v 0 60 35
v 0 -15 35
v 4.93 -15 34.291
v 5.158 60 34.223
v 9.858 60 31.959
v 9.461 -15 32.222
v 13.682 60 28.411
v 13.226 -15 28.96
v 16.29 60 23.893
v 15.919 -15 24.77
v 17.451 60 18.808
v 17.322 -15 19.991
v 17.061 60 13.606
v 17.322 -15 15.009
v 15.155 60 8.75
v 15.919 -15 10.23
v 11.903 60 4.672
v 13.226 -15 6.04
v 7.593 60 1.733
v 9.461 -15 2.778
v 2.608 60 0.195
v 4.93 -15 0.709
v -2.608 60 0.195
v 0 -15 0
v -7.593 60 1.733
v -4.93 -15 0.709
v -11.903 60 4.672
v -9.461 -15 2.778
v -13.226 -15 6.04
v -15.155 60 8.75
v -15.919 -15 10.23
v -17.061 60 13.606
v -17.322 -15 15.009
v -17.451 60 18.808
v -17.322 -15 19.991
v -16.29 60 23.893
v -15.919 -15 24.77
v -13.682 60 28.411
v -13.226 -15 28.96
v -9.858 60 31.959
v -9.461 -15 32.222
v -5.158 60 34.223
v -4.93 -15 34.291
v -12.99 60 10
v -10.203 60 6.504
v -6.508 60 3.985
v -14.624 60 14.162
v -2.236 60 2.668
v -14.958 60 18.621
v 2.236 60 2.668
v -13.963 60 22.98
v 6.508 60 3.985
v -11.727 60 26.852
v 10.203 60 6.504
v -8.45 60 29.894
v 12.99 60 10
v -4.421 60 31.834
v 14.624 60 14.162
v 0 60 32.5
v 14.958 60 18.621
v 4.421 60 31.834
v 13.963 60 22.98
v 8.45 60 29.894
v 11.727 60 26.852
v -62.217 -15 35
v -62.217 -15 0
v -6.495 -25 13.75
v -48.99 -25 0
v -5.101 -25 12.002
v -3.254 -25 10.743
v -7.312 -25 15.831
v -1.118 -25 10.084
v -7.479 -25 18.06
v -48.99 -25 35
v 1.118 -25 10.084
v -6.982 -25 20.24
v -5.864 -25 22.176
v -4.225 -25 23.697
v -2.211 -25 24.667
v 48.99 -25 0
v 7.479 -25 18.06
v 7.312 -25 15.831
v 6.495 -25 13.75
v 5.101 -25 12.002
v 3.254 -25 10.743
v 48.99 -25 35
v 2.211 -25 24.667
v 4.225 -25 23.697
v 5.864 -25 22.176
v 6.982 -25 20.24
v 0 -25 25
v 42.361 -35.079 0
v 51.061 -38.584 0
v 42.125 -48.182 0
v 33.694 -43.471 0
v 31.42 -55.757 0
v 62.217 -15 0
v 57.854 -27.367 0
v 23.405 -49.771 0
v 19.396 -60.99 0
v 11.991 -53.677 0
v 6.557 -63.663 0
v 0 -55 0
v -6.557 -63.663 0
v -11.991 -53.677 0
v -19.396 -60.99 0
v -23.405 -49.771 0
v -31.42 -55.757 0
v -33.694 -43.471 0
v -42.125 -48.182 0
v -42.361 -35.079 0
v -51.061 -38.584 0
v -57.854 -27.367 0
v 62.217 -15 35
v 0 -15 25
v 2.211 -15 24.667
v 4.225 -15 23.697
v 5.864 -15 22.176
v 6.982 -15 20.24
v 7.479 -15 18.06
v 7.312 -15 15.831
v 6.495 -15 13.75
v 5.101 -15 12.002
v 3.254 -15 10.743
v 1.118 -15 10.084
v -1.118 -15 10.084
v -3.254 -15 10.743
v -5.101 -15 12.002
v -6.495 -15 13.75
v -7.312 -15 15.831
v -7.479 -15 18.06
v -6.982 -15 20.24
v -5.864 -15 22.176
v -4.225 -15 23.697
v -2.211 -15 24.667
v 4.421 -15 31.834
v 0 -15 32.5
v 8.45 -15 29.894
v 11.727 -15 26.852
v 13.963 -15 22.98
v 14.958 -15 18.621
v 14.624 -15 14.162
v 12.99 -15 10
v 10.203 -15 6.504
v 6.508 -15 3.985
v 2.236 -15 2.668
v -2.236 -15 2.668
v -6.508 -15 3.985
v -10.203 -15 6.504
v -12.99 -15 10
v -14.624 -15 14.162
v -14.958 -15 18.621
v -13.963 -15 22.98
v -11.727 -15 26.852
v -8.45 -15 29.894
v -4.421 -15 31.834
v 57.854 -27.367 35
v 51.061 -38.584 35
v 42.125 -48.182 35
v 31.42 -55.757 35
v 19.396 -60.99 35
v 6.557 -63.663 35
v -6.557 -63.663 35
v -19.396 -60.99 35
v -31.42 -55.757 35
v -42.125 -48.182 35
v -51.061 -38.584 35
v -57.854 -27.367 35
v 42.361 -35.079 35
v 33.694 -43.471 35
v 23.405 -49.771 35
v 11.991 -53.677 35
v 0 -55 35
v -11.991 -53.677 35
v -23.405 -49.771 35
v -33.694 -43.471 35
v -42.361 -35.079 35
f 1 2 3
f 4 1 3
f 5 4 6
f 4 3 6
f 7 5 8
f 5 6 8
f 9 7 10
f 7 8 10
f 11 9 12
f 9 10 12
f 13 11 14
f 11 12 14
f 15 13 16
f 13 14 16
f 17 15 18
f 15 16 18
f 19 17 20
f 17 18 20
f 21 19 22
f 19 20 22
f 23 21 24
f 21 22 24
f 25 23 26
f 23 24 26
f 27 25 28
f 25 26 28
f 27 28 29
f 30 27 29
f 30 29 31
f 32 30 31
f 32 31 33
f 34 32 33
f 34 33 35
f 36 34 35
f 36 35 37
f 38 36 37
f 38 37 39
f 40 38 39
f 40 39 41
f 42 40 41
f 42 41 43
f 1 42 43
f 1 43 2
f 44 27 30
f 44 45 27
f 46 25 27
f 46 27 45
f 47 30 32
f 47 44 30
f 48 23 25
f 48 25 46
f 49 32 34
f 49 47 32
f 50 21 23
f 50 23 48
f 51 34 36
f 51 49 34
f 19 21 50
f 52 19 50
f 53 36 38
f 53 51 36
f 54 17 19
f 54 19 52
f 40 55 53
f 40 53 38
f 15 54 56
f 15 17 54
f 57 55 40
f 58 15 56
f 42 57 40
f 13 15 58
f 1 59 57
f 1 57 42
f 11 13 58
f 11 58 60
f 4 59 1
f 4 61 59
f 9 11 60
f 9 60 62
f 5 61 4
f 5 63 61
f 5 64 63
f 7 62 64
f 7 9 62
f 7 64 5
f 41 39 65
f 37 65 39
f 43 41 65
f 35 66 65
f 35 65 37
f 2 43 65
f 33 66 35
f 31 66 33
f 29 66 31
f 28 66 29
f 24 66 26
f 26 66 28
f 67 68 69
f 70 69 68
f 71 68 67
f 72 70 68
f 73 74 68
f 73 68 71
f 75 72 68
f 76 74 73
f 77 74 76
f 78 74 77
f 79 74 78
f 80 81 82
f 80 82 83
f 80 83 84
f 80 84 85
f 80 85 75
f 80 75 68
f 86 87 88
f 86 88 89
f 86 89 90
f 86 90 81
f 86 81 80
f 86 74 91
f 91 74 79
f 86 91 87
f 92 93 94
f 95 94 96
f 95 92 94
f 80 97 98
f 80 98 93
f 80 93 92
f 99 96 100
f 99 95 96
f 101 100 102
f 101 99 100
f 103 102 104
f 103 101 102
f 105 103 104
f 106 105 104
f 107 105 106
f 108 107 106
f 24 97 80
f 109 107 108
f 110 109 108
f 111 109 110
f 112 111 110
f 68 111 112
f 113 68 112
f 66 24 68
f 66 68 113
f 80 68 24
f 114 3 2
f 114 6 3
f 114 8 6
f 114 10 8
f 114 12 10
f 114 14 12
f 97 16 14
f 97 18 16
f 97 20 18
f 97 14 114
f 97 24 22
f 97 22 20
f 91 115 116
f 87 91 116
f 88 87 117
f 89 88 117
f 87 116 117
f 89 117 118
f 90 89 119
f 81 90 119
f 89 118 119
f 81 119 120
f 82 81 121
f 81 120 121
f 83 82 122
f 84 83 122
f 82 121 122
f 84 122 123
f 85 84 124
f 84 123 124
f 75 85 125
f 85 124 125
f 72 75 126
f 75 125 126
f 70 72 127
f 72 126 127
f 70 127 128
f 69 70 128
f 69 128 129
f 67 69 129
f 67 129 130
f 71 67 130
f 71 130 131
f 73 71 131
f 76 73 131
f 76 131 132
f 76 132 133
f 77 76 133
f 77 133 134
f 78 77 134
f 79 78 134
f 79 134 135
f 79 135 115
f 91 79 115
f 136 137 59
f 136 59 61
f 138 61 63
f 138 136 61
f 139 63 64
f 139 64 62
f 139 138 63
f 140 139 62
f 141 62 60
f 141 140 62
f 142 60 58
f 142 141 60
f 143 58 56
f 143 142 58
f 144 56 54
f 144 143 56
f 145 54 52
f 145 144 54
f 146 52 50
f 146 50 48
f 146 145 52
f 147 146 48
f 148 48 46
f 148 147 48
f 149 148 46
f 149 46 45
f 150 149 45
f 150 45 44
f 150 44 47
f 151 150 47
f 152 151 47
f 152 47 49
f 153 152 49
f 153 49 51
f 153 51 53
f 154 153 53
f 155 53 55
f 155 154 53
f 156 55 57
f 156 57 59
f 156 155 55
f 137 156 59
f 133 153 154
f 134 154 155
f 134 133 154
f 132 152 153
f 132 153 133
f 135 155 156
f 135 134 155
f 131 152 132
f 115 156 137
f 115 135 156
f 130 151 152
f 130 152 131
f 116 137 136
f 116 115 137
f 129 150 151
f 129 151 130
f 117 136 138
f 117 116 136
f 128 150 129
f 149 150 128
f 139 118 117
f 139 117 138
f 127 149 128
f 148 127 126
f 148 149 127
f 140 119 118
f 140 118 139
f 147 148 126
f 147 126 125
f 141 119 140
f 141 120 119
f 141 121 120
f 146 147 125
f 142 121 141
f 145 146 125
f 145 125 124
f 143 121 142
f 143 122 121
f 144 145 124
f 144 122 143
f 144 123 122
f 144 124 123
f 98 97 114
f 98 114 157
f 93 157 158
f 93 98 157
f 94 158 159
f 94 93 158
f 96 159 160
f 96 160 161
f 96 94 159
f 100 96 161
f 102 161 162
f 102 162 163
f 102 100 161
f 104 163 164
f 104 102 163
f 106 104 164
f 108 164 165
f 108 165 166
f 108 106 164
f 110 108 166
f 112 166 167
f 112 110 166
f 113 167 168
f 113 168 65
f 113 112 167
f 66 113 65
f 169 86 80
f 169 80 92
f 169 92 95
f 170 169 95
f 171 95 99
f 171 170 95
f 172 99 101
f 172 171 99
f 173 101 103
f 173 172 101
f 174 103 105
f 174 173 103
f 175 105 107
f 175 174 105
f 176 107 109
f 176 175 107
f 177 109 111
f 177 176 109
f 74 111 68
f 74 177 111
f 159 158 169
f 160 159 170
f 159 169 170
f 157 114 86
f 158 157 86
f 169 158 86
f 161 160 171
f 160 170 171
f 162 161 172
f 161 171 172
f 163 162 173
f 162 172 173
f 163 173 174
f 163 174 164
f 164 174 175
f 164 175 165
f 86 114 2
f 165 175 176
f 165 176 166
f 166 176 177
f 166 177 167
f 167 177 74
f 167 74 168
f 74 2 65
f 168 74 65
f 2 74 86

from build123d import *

# Parameters (mm, degrees)
Y_KSEKLIK_EKSTR_ZYON1_DEPTH = 35
KES_EKSTR_ZYON1_DEPTH       = 35
IZIM3_R                     = 17.5
IZIM3_R_2                   = 15
Y_KSEKLIK_EKSTR_ZYON2_DEPTH = 75
IZIM4_R                     = 7.5
KES_EKSTR_ZYON2_DEPTH       = 28


with BuildPart() as part:
    # Çizim1 → Yükseklik-Ekstrüzyon1 (new body)
    with BuildSketch(Plane.XY):
        with BuildLine():
            Line((-62.217360921, -15), (62.217360921, -15))
            ThreePointArc((62.217360921, -15), (0, -64), (-62.217360921, -15))
        make_face()
    extrude(amount=Y_KSEKLIK_EKSTR_ZYON1_DEPTH)

    # Çizim2 → Kes-Ekstrüzyon1 (cut)
    with BuildSketch(Plane.XY.offset(35)):
        with BuildLine():
            Line((-48.989794856, -25), (48.989794856, -25))
            ThreePointArc((48.989794856, -25), (0, -55), (-48.989794856, -25))
        make_face()
    extrude(amount=-KES_EKSTR_ZYON1_DEPTH, mode=Mode.SUBTRACT)

    # Çizim3 → Yükseklik-Ekstrüzyon2 (add)
    with BuildSketch(Plane(origin=(0, -15, 0), x_dir=(1, 0, 0), z_dir=(0, 1, 0))):
        with Locations(Location((0, -17.5, 0), (0, 0, 270))):
            Circle(IZIM3_R)
        with Locations(Location((0, -17.5, 0), (0, 0, 270))):
            Circle(IZIM3_R_2, mode=Mode.SUBTRACT)
    extrude(amount=Y_KSEKLIK_EKSTR_ZYON2_DEPTH)

    # Çizim4 → Kes-Ekstrüzyon2 (cut)
    with BuildSketch(Plane(origin=(0, -15, 0), x_dir=(1, 0, 0), z_dir=(0, 1, 0))):
        with Locations(Location((0, -17.5, 0), (0, 0, 270))):
            Circle(IZIM4_R)
    extrude(amount=-KES_EKSTR_ZYON2_DEPTH, mode=Mode.SUBTRACT)


solid = part.part
